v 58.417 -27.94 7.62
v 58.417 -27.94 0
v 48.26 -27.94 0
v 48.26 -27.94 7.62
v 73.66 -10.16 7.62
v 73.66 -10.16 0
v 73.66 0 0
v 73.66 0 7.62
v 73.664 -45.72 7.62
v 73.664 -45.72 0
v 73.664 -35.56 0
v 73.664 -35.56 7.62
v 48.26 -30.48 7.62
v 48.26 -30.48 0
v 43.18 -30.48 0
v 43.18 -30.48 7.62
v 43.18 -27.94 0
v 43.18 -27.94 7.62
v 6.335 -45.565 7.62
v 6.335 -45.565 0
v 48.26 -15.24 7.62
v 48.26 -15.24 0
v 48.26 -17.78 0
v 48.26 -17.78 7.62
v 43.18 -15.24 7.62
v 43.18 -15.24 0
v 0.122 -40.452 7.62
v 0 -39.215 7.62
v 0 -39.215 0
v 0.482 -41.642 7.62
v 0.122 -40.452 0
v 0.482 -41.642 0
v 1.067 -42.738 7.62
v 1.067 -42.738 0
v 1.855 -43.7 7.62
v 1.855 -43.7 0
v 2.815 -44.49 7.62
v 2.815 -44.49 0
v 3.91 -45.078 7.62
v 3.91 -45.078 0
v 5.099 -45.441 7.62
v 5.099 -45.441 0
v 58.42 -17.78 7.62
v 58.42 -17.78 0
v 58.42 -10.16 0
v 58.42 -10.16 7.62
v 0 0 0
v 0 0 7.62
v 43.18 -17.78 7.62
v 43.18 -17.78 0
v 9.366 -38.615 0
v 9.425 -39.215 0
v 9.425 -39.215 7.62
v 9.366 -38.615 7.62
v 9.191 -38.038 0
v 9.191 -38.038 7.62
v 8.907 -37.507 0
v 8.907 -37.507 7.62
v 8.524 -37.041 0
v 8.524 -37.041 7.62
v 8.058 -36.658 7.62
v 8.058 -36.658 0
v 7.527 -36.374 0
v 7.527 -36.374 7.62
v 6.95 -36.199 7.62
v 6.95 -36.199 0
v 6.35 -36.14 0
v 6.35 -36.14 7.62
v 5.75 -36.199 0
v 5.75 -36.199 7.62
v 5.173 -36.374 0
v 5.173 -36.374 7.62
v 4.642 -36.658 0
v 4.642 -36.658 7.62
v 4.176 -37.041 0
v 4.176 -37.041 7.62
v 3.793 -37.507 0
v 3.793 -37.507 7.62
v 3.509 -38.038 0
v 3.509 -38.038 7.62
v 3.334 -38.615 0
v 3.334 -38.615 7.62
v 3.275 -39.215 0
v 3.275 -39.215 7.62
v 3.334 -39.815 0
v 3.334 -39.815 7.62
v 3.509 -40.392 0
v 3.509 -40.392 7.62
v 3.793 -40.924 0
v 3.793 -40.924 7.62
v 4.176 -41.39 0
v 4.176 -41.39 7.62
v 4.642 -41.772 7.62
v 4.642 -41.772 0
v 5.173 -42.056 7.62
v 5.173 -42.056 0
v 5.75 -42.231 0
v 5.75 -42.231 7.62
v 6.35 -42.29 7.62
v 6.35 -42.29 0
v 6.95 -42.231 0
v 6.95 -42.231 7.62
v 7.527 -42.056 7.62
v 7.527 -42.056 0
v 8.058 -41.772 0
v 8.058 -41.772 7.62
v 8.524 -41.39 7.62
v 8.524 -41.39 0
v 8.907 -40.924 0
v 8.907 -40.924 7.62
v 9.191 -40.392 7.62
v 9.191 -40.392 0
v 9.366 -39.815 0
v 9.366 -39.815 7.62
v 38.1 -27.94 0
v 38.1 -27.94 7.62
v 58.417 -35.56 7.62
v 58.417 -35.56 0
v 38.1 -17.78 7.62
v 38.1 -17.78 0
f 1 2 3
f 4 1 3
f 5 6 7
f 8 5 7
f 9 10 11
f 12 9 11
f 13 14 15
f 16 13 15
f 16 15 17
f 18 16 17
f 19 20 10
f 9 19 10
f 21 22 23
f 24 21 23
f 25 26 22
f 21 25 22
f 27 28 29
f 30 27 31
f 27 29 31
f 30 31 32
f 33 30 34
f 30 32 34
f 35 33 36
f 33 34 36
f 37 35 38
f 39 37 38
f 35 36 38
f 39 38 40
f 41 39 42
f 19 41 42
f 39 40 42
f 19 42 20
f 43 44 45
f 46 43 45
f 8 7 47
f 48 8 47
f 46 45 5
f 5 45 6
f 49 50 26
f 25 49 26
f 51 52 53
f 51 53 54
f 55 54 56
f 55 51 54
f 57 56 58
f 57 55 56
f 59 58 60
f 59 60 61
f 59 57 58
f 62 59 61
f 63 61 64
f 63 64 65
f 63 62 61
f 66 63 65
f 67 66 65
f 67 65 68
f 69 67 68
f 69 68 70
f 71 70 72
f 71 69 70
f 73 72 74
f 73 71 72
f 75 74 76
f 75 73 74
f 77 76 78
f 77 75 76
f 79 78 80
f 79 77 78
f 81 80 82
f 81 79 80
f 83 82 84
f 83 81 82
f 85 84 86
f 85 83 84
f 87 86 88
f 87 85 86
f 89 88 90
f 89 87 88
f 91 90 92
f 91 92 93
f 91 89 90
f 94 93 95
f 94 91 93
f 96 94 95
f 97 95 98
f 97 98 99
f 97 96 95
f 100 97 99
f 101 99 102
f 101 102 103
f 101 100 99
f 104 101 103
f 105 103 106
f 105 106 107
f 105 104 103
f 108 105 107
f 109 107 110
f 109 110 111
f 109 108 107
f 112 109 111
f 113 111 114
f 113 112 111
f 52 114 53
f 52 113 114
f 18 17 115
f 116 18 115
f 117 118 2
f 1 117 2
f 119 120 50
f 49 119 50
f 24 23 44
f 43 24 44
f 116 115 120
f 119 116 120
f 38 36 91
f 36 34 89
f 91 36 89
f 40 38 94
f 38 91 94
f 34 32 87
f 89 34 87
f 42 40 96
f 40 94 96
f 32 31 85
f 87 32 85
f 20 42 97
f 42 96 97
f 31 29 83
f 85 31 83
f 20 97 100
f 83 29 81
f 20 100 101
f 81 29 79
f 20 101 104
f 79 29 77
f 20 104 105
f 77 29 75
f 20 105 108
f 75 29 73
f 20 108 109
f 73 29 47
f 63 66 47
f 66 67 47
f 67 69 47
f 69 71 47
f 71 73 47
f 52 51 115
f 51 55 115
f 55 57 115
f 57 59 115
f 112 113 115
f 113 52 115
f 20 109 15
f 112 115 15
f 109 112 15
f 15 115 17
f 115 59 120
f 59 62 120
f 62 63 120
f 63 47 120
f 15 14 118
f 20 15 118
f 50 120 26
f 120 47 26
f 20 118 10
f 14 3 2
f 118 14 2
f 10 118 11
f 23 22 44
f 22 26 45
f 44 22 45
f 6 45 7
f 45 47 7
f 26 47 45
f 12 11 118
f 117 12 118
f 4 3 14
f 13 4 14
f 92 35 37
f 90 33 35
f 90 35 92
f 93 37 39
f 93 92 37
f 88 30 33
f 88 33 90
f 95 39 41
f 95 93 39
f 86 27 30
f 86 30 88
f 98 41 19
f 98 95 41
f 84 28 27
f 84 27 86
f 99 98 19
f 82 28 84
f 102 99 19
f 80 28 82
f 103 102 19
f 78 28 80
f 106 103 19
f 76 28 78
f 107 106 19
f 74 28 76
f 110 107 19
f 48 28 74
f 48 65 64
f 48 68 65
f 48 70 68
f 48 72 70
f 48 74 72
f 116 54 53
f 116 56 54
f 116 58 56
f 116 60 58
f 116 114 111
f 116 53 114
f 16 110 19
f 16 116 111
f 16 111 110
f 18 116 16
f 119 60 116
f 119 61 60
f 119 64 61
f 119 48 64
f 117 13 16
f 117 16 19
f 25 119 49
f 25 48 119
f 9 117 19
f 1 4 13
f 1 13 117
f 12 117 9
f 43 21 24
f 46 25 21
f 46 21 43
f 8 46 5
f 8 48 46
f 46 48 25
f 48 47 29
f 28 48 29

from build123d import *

# Parameters (mm, degrees)
F0_R     = 3.07505
F1_DEPTH = 7.62


with BuildPart() as f1:
    # F0 (on Top) → F1 (new body)
    with BuildSketch(Plane.XY):
        with BuildLine():
            Line((73.66, 0), (0, 0))
            Line((0, 0), (0, -39.215128))
            ThreePointArc((0, -39.215128), (1.85471, -43.700088), (6.335392, -45.565111))
            Line((6.335392, -45.565111), (73.664084, -45.72))
            Line((73.664084, -45.72), (73.664084, -35.56))
            Line((73.664084, -35.56), (58.417156, -35.56))
            Line((58.417156, -35.56), (58.417156, -27.94))
            Line((58.417156, -27.94), (48.26, -27.94))
            Line((48.26, -27.94), (48.26, -30.48))
            Line((48.26, -30.48), (43.18, -30.48))
            Line((43.18, -30.48), (43.18, -27.94))
            Line((43.18, -27.94), (38.1, -27.94))
            Line((38.1, -27.94), (38.1, -17.78))
            Line((38.1, -17.78), (43.18, -17.78))
            Line((43.18, -17.78), (43.18, -15.24))
            Line((43.18, -15.24), (48.26, -15.24))
            Line((48.26, -15.24), (48.26, -17.78))
            Line((48.26, -17.78), (58.42, -17.78))
            Line((58.42, -17.78), (58.42, -10.16))
            Line((58.42, -10.16), (73.66, -10.16))
            Line((73.66, -10.16), (73.66, 0))
        make_face()
        with Locations((6.35, -39.215128)):
            Circle(F0_R, mode=Mode.SUBTRACT)
    extrude(amount=F1_DEPTH)


solid = f1.part
